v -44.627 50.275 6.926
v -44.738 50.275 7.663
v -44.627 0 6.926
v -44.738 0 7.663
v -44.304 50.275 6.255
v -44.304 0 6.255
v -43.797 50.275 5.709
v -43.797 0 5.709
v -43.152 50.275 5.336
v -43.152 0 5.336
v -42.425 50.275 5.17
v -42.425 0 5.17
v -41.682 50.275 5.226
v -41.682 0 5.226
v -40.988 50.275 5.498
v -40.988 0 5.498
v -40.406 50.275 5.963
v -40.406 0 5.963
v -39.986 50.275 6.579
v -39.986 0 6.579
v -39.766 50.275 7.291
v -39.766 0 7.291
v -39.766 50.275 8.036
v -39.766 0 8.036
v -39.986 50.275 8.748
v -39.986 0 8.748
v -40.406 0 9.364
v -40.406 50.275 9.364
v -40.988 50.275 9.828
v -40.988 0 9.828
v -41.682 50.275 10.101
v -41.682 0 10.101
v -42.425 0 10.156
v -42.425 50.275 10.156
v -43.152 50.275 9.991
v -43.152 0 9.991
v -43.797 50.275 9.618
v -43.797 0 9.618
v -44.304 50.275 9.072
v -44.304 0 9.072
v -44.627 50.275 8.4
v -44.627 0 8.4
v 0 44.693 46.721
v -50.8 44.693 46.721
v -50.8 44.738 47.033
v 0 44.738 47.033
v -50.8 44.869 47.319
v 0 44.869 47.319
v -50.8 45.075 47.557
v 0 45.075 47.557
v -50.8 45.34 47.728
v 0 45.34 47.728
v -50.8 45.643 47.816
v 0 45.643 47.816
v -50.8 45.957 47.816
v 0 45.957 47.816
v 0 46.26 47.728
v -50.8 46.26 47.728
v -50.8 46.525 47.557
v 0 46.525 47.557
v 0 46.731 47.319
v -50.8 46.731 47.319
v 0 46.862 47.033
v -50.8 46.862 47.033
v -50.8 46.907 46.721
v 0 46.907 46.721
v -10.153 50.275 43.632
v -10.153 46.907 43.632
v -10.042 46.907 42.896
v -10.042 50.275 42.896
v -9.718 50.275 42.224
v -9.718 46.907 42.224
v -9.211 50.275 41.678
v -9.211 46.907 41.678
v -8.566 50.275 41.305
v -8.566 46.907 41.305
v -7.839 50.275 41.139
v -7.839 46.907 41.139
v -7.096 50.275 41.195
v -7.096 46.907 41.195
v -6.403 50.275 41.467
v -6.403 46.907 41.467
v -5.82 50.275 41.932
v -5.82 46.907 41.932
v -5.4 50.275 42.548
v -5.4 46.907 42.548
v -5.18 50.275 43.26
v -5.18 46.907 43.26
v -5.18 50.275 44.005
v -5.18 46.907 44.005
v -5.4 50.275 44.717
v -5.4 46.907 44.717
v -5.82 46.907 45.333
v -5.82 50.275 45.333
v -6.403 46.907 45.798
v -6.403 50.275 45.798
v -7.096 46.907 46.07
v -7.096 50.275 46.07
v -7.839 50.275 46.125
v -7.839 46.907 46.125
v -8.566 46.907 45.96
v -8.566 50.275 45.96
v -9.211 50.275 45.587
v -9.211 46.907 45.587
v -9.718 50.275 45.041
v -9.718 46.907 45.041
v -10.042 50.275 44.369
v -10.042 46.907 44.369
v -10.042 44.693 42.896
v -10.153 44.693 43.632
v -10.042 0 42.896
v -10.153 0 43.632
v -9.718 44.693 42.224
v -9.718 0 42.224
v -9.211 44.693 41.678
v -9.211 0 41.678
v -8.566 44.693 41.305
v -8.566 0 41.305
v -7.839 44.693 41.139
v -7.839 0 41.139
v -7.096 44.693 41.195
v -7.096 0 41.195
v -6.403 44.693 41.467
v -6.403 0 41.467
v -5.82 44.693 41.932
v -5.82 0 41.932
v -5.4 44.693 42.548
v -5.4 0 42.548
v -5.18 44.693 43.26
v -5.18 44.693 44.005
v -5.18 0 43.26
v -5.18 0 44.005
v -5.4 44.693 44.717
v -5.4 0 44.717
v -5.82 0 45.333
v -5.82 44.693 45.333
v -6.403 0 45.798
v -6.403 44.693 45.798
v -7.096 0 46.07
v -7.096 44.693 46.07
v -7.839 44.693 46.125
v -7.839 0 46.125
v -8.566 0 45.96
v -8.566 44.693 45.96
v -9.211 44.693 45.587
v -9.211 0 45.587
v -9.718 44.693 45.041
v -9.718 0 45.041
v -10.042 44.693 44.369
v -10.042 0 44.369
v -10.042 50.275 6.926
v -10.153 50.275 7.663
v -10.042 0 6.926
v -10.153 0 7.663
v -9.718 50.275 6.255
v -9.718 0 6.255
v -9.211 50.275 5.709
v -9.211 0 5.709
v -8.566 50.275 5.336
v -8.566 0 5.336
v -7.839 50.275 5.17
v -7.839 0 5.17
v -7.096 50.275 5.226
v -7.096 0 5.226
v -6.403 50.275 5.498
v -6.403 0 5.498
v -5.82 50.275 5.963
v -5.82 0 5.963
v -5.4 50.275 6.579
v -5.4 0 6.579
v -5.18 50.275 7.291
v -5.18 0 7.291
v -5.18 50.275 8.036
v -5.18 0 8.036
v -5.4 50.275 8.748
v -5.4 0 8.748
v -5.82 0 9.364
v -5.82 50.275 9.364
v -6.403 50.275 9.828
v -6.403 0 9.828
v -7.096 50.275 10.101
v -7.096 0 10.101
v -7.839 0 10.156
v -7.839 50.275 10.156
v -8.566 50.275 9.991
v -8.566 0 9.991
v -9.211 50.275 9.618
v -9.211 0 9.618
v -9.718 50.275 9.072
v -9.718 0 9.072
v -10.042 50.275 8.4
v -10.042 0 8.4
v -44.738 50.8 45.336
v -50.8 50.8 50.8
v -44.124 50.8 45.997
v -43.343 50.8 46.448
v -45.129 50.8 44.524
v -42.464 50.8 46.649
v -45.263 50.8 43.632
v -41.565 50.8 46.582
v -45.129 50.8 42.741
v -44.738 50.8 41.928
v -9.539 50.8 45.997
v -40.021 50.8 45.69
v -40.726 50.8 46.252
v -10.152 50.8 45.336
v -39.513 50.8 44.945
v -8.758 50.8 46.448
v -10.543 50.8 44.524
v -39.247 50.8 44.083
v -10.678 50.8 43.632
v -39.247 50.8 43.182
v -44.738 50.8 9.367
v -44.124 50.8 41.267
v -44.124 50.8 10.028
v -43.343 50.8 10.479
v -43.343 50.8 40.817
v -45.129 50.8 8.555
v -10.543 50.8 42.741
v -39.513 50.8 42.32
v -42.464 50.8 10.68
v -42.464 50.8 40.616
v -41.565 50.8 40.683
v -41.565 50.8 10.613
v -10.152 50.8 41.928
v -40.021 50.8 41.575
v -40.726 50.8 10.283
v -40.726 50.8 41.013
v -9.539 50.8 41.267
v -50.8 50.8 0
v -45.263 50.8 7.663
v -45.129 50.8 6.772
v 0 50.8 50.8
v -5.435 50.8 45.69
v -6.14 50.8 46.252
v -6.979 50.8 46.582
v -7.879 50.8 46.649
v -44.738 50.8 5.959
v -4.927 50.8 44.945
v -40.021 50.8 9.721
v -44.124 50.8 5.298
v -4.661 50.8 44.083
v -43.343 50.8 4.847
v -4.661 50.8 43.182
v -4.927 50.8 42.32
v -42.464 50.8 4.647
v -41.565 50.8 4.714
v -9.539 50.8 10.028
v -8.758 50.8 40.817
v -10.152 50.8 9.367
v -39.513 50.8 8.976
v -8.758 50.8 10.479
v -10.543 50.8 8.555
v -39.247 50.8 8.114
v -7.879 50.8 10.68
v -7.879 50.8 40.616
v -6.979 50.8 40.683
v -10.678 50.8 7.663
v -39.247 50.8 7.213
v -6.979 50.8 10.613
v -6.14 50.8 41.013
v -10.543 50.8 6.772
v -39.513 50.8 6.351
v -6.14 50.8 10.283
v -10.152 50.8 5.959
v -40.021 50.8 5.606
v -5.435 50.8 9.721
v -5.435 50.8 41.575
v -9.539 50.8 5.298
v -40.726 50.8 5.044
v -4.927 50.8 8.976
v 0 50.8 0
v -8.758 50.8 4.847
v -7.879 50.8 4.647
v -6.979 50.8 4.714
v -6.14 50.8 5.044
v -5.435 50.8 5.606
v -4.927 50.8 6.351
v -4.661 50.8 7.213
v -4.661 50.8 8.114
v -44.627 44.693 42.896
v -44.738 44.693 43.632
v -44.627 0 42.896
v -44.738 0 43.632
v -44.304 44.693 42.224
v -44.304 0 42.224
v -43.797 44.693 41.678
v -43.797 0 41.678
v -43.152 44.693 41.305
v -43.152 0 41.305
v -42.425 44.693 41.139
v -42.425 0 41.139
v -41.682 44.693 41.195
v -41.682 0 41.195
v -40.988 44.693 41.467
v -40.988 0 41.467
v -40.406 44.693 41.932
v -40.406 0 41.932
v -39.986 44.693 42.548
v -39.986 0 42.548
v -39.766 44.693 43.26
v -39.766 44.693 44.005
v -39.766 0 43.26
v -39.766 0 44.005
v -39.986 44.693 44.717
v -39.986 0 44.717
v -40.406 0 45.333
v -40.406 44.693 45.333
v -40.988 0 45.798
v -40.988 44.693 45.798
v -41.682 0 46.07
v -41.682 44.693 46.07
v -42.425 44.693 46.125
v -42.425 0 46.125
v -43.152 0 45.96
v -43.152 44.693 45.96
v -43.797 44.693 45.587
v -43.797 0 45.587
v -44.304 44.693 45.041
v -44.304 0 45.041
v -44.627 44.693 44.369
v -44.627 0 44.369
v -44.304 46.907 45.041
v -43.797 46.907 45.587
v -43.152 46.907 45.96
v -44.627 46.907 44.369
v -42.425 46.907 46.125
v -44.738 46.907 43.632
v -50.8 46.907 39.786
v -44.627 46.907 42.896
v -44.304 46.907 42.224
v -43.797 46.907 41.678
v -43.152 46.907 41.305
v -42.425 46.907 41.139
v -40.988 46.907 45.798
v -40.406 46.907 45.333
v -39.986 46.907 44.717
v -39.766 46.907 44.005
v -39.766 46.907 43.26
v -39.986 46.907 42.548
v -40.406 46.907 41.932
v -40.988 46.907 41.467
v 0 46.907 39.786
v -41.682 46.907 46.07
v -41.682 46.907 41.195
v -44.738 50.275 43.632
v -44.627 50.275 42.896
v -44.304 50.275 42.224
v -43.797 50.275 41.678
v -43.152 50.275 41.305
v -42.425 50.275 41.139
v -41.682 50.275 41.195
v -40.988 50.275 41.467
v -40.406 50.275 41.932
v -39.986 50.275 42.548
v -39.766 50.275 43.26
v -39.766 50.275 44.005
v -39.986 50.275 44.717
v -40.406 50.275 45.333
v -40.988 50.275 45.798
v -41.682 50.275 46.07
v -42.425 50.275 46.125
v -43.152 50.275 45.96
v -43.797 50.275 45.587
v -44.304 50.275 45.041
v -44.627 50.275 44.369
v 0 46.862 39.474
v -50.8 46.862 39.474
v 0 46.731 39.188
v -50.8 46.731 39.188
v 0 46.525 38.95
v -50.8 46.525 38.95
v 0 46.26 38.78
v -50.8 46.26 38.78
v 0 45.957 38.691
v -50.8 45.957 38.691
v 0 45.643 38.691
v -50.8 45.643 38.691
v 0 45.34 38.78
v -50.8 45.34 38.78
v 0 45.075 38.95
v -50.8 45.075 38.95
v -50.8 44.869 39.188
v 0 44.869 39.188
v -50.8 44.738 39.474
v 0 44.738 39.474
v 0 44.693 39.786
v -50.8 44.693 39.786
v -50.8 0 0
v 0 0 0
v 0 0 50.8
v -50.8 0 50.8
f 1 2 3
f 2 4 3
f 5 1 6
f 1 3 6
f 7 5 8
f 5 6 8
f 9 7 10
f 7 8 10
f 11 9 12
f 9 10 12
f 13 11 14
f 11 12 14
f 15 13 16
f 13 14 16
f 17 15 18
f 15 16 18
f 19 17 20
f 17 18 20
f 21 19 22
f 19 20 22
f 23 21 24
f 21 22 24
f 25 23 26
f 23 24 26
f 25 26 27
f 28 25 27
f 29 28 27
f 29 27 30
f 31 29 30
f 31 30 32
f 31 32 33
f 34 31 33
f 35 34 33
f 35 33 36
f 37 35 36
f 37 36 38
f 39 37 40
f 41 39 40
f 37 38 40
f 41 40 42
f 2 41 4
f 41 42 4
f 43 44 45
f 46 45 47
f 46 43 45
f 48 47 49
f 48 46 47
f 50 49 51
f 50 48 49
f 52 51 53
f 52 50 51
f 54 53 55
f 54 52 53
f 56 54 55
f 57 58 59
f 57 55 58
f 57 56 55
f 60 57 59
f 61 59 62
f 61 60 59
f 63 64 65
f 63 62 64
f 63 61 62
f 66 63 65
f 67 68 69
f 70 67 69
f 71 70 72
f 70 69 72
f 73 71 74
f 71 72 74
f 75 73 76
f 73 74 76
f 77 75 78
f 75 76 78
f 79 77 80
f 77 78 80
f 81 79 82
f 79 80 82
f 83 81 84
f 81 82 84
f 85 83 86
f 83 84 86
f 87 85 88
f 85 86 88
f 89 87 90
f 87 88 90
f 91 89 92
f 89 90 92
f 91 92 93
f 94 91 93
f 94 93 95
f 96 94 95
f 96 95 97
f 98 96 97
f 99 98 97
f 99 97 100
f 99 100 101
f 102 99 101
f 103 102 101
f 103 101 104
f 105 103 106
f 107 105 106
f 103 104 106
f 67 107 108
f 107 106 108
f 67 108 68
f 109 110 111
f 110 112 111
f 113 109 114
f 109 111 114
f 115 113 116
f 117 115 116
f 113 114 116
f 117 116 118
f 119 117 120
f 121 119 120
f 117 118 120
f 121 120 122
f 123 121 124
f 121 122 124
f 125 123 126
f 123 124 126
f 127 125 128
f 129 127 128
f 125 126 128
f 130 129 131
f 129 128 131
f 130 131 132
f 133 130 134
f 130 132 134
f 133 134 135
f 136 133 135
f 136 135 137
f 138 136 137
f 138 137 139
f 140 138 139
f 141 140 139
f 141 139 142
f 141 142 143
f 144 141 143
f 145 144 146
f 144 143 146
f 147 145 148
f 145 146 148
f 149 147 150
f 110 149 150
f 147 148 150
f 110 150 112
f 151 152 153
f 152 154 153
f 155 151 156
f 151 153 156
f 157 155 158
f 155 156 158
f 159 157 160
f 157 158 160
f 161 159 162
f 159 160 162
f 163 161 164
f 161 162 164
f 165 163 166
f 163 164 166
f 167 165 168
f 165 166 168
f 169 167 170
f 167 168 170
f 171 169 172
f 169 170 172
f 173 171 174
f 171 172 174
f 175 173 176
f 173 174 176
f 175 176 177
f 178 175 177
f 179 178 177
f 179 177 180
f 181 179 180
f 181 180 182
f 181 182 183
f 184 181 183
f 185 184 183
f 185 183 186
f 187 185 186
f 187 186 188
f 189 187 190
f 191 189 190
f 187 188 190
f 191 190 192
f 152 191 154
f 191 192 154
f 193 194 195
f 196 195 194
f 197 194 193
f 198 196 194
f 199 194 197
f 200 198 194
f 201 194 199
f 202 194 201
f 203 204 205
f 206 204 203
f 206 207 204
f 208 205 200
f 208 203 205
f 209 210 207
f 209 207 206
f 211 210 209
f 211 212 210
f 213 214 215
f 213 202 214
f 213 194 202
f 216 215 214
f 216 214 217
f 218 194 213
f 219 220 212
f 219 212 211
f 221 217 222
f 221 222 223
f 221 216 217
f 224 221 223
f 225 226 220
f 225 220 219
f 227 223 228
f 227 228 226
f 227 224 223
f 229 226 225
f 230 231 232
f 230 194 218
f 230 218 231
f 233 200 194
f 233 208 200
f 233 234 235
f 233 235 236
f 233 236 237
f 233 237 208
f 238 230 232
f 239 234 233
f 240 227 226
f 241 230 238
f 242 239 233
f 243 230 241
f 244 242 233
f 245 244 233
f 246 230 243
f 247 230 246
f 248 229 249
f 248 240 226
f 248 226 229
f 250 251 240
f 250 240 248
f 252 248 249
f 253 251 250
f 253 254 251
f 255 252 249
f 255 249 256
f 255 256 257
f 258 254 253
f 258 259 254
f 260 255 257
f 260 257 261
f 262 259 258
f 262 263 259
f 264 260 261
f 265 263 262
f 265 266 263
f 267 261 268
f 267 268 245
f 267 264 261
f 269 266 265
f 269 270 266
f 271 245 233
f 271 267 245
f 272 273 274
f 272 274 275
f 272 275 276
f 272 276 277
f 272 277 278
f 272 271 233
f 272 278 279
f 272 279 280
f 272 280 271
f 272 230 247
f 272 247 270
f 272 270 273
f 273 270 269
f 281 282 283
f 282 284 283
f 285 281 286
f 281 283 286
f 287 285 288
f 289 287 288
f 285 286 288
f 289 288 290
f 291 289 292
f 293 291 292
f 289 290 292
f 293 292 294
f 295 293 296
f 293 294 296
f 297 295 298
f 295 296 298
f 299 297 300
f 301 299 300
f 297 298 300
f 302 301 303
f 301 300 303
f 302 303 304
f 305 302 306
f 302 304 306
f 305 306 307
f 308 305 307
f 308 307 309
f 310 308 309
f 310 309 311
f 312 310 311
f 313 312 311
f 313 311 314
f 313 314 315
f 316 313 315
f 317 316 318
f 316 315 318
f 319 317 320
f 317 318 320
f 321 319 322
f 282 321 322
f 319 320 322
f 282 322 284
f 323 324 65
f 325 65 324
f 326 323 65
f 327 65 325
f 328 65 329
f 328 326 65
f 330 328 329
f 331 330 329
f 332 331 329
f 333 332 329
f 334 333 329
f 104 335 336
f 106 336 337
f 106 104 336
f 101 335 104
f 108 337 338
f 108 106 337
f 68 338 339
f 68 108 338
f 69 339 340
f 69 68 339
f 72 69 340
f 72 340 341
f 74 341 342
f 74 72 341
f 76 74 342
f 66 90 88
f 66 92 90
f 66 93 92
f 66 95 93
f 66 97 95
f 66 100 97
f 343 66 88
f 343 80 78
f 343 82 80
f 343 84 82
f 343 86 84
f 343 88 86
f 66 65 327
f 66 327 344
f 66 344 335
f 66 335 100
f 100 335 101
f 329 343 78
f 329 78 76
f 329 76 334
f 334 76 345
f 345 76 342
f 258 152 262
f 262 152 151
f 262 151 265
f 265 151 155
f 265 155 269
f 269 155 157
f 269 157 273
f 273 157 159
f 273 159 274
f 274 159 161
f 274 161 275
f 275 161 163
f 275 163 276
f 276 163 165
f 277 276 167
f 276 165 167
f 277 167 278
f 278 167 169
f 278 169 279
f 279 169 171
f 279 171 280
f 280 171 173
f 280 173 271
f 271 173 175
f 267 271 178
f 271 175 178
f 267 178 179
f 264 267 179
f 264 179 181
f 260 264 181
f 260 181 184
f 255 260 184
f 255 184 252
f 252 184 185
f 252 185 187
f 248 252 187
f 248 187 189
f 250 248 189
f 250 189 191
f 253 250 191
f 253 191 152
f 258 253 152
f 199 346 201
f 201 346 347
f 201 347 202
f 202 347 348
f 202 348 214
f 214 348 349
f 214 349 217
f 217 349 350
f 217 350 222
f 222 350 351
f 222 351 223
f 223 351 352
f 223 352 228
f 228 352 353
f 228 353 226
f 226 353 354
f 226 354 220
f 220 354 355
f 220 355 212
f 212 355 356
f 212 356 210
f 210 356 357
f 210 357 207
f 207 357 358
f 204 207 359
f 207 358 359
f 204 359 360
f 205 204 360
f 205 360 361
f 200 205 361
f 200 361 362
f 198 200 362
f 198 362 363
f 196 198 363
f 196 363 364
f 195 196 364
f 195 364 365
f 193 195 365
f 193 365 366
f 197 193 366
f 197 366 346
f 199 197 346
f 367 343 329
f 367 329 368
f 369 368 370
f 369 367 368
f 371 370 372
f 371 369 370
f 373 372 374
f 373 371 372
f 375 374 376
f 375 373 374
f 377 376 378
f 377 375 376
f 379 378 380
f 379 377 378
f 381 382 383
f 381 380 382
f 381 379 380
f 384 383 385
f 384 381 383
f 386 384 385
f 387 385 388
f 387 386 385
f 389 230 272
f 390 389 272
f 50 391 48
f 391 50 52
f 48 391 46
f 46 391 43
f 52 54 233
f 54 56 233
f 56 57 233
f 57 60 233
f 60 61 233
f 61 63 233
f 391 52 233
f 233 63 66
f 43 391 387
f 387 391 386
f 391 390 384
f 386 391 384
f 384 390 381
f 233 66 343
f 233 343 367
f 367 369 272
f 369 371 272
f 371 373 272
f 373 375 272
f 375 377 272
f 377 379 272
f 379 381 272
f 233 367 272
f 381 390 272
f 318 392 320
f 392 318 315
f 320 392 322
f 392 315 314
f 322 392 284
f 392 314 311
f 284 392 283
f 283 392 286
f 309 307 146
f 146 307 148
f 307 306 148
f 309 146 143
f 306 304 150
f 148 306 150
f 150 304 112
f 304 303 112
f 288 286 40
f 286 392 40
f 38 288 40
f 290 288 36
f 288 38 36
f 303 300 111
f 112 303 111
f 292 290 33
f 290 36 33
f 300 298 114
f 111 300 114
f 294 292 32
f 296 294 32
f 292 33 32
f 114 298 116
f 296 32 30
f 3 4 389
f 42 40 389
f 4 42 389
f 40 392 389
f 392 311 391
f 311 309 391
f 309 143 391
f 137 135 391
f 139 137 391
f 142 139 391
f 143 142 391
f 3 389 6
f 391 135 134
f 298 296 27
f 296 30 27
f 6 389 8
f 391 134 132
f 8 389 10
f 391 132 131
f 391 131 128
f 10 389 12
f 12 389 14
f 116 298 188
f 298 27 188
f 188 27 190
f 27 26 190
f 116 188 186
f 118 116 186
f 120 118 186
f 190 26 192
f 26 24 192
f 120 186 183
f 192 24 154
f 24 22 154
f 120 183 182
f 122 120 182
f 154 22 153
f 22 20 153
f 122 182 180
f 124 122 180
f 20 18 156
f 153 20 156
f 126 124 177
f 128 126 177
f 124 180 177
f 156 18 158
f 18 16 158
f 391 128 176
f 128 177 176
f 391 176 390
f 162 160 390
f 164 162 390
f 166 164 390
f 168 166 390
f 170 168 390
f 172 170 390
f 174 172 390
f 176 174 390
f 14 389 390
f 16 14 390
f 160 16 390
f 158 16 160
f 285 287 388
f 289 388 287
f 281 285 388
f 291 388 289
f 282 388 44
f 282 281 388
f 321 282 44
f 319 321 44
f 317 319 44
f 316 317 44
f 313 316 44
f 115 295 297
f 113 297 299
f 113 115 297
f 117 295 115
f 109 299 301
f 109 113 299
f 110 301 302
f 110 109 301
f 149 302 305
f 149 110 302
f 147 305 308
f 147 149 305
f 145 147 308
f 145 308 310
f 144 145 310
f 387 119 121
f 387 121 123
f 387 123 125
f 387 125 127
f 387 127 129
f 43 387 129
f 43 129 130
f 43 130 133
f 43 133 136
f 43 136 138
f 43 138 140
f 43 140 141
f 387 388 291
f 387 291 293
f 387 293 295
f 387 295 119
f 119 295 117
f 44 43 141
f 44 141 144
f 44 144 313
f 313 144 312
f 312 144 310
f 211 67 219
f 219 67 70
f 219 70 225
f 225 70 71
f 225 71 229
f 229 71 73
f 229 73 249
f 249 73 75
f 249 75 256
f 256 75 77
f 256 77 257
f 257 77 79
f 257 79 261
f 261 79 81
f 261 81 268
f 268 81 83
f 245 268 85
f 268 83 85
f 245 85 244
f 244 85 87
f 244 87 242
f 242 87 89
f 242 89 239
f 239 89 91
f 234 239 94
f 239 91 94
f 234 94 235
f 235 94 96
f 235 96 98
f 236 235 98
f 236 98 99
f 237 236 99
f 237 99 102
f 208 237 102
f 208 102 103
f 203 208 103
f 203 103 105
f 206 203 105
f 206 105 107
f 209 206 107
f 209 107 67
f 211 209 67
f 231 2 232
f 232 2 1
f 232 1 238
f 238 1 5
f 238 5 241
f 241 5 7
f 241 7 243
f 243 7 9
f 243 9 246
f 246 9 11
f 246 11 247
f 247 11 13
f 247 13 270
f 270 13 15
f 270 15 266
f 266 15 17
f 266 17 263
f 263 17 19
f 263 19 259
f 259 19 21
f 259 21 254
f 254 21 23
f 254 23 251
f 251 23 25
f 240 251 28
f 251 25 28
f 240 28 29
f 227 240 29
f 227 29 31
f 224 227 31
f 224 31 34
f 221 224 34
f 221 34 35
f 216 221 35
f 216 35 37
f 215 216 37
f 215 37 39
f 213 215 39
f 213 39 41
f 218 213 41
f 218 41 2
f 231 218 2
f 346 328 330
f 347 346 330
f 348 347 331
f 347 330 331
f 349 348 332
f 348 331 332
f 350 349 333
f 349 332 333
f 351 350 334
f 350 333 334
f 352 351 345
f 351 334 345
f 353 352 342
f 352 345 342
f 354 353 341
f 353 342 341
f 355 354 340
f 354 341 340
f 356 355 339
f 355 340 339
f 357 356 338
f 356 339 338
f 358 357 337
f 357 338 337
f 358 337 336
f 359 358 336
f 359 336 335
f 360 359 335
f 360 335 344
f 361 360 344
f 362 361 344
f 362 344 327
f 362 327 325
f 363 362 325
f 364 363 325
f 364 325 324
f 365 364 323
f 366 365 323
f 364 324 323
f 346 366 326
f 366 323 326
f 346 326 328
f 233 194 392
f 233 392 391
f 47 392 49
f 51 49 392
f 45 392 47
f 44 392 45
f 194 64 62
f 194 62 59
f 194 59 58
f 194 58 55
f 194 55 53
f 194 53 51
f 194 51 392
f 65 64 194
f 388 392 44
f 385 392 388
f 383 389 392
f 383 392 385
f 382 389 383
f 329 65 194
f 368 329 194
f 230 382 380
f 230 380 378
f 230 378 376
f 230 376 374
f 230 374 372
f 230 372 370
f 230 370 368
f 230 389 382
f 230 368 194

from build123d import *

# Parameters (mm, degrees)
ESQUISSE1_W                 = 50.8
ESQUISSE1_H                 = 50.8
BOSS_EXTRU_1_DEPTH          = 50.8
TROU_TARAUD_M61_D           = 5
TROU_TARAUD_M61_CSINK_D     = 6.05
TROU_TARAUD_M61_CSINK_ANGLE = 90
ENL_V_MAT_EXTRU_2_REACH     = 89.988


with BuildPart() as part:
    # Esquisse1 → Boss.-Extru.1 (new body)
    with BuildSketch(Plane.XY):
        with Locations((-25.4, 25.4)):
            Rectangle(ESQUISSE1_W, ESQUISSE1_H)
    extrude(amount=BOSS_EXTRU_1_DEPTH)

    # Trou taraudé M61 (through all)
    with Locations(Plane(origin=(0, 50.8, 0), x_dir=(1, 0, 0), z_dir=(0, 1, 0))):
        with Locations((-42.238223885, -7.663368272), (-7.652573676, -7.663368272), (-7.652573676, -43.63244449), (-42.238223885, -43.63244449)):
            CounterSinkHole(TROU_TARAUD_M61_D / 2, TROU_TARAUD_M61_CSINK_D / 2, counter_sink_angle=TROU_TARAUD_M61_CSINK_ANGLE)

    # Esquisse4 → Enlèv. mat.-Extru.2 (cut, up to next)
    with BuildSketch(Plane(origin=(0, 0, 0), x_dir=(0, 0, -1), z_dir=(1, 0, 0)), mode=Mode.PRIVATE) as enl_v_mat_extru_2_sk1:
        with BuildLine():
            Line((-46.721032859, 46.906628003), (-39.78616404, 46.906628003))
            ThreePointArc((-39.78616404, 46.906628003), (-38.679536037, 45.8), (-39.78616404, 44.693371997))
            Line((-39.78616404, 44.693371997), (-46.721032859, 44.693371997))
            ThreePointArc((-46.721032859, 44.693371997), (-47.827660862, 45.8), (-46.721032859, 46.906628003))
        make_face()
    enl_v_mat_extru_2_tool1 = extrude(enl_v_mat_extru_2_sk1.sketch, amount=-ENL_V_MAT_EXTRU_2_REACH, mode=Mode.PRIVATE) & part.part
    add(enl_v_mat_extru_2_tool1.solids().sort_by_distance((0, 45.8, 43.253598))[0], mode=Mode.SUBTRACT)


solid = part.part
